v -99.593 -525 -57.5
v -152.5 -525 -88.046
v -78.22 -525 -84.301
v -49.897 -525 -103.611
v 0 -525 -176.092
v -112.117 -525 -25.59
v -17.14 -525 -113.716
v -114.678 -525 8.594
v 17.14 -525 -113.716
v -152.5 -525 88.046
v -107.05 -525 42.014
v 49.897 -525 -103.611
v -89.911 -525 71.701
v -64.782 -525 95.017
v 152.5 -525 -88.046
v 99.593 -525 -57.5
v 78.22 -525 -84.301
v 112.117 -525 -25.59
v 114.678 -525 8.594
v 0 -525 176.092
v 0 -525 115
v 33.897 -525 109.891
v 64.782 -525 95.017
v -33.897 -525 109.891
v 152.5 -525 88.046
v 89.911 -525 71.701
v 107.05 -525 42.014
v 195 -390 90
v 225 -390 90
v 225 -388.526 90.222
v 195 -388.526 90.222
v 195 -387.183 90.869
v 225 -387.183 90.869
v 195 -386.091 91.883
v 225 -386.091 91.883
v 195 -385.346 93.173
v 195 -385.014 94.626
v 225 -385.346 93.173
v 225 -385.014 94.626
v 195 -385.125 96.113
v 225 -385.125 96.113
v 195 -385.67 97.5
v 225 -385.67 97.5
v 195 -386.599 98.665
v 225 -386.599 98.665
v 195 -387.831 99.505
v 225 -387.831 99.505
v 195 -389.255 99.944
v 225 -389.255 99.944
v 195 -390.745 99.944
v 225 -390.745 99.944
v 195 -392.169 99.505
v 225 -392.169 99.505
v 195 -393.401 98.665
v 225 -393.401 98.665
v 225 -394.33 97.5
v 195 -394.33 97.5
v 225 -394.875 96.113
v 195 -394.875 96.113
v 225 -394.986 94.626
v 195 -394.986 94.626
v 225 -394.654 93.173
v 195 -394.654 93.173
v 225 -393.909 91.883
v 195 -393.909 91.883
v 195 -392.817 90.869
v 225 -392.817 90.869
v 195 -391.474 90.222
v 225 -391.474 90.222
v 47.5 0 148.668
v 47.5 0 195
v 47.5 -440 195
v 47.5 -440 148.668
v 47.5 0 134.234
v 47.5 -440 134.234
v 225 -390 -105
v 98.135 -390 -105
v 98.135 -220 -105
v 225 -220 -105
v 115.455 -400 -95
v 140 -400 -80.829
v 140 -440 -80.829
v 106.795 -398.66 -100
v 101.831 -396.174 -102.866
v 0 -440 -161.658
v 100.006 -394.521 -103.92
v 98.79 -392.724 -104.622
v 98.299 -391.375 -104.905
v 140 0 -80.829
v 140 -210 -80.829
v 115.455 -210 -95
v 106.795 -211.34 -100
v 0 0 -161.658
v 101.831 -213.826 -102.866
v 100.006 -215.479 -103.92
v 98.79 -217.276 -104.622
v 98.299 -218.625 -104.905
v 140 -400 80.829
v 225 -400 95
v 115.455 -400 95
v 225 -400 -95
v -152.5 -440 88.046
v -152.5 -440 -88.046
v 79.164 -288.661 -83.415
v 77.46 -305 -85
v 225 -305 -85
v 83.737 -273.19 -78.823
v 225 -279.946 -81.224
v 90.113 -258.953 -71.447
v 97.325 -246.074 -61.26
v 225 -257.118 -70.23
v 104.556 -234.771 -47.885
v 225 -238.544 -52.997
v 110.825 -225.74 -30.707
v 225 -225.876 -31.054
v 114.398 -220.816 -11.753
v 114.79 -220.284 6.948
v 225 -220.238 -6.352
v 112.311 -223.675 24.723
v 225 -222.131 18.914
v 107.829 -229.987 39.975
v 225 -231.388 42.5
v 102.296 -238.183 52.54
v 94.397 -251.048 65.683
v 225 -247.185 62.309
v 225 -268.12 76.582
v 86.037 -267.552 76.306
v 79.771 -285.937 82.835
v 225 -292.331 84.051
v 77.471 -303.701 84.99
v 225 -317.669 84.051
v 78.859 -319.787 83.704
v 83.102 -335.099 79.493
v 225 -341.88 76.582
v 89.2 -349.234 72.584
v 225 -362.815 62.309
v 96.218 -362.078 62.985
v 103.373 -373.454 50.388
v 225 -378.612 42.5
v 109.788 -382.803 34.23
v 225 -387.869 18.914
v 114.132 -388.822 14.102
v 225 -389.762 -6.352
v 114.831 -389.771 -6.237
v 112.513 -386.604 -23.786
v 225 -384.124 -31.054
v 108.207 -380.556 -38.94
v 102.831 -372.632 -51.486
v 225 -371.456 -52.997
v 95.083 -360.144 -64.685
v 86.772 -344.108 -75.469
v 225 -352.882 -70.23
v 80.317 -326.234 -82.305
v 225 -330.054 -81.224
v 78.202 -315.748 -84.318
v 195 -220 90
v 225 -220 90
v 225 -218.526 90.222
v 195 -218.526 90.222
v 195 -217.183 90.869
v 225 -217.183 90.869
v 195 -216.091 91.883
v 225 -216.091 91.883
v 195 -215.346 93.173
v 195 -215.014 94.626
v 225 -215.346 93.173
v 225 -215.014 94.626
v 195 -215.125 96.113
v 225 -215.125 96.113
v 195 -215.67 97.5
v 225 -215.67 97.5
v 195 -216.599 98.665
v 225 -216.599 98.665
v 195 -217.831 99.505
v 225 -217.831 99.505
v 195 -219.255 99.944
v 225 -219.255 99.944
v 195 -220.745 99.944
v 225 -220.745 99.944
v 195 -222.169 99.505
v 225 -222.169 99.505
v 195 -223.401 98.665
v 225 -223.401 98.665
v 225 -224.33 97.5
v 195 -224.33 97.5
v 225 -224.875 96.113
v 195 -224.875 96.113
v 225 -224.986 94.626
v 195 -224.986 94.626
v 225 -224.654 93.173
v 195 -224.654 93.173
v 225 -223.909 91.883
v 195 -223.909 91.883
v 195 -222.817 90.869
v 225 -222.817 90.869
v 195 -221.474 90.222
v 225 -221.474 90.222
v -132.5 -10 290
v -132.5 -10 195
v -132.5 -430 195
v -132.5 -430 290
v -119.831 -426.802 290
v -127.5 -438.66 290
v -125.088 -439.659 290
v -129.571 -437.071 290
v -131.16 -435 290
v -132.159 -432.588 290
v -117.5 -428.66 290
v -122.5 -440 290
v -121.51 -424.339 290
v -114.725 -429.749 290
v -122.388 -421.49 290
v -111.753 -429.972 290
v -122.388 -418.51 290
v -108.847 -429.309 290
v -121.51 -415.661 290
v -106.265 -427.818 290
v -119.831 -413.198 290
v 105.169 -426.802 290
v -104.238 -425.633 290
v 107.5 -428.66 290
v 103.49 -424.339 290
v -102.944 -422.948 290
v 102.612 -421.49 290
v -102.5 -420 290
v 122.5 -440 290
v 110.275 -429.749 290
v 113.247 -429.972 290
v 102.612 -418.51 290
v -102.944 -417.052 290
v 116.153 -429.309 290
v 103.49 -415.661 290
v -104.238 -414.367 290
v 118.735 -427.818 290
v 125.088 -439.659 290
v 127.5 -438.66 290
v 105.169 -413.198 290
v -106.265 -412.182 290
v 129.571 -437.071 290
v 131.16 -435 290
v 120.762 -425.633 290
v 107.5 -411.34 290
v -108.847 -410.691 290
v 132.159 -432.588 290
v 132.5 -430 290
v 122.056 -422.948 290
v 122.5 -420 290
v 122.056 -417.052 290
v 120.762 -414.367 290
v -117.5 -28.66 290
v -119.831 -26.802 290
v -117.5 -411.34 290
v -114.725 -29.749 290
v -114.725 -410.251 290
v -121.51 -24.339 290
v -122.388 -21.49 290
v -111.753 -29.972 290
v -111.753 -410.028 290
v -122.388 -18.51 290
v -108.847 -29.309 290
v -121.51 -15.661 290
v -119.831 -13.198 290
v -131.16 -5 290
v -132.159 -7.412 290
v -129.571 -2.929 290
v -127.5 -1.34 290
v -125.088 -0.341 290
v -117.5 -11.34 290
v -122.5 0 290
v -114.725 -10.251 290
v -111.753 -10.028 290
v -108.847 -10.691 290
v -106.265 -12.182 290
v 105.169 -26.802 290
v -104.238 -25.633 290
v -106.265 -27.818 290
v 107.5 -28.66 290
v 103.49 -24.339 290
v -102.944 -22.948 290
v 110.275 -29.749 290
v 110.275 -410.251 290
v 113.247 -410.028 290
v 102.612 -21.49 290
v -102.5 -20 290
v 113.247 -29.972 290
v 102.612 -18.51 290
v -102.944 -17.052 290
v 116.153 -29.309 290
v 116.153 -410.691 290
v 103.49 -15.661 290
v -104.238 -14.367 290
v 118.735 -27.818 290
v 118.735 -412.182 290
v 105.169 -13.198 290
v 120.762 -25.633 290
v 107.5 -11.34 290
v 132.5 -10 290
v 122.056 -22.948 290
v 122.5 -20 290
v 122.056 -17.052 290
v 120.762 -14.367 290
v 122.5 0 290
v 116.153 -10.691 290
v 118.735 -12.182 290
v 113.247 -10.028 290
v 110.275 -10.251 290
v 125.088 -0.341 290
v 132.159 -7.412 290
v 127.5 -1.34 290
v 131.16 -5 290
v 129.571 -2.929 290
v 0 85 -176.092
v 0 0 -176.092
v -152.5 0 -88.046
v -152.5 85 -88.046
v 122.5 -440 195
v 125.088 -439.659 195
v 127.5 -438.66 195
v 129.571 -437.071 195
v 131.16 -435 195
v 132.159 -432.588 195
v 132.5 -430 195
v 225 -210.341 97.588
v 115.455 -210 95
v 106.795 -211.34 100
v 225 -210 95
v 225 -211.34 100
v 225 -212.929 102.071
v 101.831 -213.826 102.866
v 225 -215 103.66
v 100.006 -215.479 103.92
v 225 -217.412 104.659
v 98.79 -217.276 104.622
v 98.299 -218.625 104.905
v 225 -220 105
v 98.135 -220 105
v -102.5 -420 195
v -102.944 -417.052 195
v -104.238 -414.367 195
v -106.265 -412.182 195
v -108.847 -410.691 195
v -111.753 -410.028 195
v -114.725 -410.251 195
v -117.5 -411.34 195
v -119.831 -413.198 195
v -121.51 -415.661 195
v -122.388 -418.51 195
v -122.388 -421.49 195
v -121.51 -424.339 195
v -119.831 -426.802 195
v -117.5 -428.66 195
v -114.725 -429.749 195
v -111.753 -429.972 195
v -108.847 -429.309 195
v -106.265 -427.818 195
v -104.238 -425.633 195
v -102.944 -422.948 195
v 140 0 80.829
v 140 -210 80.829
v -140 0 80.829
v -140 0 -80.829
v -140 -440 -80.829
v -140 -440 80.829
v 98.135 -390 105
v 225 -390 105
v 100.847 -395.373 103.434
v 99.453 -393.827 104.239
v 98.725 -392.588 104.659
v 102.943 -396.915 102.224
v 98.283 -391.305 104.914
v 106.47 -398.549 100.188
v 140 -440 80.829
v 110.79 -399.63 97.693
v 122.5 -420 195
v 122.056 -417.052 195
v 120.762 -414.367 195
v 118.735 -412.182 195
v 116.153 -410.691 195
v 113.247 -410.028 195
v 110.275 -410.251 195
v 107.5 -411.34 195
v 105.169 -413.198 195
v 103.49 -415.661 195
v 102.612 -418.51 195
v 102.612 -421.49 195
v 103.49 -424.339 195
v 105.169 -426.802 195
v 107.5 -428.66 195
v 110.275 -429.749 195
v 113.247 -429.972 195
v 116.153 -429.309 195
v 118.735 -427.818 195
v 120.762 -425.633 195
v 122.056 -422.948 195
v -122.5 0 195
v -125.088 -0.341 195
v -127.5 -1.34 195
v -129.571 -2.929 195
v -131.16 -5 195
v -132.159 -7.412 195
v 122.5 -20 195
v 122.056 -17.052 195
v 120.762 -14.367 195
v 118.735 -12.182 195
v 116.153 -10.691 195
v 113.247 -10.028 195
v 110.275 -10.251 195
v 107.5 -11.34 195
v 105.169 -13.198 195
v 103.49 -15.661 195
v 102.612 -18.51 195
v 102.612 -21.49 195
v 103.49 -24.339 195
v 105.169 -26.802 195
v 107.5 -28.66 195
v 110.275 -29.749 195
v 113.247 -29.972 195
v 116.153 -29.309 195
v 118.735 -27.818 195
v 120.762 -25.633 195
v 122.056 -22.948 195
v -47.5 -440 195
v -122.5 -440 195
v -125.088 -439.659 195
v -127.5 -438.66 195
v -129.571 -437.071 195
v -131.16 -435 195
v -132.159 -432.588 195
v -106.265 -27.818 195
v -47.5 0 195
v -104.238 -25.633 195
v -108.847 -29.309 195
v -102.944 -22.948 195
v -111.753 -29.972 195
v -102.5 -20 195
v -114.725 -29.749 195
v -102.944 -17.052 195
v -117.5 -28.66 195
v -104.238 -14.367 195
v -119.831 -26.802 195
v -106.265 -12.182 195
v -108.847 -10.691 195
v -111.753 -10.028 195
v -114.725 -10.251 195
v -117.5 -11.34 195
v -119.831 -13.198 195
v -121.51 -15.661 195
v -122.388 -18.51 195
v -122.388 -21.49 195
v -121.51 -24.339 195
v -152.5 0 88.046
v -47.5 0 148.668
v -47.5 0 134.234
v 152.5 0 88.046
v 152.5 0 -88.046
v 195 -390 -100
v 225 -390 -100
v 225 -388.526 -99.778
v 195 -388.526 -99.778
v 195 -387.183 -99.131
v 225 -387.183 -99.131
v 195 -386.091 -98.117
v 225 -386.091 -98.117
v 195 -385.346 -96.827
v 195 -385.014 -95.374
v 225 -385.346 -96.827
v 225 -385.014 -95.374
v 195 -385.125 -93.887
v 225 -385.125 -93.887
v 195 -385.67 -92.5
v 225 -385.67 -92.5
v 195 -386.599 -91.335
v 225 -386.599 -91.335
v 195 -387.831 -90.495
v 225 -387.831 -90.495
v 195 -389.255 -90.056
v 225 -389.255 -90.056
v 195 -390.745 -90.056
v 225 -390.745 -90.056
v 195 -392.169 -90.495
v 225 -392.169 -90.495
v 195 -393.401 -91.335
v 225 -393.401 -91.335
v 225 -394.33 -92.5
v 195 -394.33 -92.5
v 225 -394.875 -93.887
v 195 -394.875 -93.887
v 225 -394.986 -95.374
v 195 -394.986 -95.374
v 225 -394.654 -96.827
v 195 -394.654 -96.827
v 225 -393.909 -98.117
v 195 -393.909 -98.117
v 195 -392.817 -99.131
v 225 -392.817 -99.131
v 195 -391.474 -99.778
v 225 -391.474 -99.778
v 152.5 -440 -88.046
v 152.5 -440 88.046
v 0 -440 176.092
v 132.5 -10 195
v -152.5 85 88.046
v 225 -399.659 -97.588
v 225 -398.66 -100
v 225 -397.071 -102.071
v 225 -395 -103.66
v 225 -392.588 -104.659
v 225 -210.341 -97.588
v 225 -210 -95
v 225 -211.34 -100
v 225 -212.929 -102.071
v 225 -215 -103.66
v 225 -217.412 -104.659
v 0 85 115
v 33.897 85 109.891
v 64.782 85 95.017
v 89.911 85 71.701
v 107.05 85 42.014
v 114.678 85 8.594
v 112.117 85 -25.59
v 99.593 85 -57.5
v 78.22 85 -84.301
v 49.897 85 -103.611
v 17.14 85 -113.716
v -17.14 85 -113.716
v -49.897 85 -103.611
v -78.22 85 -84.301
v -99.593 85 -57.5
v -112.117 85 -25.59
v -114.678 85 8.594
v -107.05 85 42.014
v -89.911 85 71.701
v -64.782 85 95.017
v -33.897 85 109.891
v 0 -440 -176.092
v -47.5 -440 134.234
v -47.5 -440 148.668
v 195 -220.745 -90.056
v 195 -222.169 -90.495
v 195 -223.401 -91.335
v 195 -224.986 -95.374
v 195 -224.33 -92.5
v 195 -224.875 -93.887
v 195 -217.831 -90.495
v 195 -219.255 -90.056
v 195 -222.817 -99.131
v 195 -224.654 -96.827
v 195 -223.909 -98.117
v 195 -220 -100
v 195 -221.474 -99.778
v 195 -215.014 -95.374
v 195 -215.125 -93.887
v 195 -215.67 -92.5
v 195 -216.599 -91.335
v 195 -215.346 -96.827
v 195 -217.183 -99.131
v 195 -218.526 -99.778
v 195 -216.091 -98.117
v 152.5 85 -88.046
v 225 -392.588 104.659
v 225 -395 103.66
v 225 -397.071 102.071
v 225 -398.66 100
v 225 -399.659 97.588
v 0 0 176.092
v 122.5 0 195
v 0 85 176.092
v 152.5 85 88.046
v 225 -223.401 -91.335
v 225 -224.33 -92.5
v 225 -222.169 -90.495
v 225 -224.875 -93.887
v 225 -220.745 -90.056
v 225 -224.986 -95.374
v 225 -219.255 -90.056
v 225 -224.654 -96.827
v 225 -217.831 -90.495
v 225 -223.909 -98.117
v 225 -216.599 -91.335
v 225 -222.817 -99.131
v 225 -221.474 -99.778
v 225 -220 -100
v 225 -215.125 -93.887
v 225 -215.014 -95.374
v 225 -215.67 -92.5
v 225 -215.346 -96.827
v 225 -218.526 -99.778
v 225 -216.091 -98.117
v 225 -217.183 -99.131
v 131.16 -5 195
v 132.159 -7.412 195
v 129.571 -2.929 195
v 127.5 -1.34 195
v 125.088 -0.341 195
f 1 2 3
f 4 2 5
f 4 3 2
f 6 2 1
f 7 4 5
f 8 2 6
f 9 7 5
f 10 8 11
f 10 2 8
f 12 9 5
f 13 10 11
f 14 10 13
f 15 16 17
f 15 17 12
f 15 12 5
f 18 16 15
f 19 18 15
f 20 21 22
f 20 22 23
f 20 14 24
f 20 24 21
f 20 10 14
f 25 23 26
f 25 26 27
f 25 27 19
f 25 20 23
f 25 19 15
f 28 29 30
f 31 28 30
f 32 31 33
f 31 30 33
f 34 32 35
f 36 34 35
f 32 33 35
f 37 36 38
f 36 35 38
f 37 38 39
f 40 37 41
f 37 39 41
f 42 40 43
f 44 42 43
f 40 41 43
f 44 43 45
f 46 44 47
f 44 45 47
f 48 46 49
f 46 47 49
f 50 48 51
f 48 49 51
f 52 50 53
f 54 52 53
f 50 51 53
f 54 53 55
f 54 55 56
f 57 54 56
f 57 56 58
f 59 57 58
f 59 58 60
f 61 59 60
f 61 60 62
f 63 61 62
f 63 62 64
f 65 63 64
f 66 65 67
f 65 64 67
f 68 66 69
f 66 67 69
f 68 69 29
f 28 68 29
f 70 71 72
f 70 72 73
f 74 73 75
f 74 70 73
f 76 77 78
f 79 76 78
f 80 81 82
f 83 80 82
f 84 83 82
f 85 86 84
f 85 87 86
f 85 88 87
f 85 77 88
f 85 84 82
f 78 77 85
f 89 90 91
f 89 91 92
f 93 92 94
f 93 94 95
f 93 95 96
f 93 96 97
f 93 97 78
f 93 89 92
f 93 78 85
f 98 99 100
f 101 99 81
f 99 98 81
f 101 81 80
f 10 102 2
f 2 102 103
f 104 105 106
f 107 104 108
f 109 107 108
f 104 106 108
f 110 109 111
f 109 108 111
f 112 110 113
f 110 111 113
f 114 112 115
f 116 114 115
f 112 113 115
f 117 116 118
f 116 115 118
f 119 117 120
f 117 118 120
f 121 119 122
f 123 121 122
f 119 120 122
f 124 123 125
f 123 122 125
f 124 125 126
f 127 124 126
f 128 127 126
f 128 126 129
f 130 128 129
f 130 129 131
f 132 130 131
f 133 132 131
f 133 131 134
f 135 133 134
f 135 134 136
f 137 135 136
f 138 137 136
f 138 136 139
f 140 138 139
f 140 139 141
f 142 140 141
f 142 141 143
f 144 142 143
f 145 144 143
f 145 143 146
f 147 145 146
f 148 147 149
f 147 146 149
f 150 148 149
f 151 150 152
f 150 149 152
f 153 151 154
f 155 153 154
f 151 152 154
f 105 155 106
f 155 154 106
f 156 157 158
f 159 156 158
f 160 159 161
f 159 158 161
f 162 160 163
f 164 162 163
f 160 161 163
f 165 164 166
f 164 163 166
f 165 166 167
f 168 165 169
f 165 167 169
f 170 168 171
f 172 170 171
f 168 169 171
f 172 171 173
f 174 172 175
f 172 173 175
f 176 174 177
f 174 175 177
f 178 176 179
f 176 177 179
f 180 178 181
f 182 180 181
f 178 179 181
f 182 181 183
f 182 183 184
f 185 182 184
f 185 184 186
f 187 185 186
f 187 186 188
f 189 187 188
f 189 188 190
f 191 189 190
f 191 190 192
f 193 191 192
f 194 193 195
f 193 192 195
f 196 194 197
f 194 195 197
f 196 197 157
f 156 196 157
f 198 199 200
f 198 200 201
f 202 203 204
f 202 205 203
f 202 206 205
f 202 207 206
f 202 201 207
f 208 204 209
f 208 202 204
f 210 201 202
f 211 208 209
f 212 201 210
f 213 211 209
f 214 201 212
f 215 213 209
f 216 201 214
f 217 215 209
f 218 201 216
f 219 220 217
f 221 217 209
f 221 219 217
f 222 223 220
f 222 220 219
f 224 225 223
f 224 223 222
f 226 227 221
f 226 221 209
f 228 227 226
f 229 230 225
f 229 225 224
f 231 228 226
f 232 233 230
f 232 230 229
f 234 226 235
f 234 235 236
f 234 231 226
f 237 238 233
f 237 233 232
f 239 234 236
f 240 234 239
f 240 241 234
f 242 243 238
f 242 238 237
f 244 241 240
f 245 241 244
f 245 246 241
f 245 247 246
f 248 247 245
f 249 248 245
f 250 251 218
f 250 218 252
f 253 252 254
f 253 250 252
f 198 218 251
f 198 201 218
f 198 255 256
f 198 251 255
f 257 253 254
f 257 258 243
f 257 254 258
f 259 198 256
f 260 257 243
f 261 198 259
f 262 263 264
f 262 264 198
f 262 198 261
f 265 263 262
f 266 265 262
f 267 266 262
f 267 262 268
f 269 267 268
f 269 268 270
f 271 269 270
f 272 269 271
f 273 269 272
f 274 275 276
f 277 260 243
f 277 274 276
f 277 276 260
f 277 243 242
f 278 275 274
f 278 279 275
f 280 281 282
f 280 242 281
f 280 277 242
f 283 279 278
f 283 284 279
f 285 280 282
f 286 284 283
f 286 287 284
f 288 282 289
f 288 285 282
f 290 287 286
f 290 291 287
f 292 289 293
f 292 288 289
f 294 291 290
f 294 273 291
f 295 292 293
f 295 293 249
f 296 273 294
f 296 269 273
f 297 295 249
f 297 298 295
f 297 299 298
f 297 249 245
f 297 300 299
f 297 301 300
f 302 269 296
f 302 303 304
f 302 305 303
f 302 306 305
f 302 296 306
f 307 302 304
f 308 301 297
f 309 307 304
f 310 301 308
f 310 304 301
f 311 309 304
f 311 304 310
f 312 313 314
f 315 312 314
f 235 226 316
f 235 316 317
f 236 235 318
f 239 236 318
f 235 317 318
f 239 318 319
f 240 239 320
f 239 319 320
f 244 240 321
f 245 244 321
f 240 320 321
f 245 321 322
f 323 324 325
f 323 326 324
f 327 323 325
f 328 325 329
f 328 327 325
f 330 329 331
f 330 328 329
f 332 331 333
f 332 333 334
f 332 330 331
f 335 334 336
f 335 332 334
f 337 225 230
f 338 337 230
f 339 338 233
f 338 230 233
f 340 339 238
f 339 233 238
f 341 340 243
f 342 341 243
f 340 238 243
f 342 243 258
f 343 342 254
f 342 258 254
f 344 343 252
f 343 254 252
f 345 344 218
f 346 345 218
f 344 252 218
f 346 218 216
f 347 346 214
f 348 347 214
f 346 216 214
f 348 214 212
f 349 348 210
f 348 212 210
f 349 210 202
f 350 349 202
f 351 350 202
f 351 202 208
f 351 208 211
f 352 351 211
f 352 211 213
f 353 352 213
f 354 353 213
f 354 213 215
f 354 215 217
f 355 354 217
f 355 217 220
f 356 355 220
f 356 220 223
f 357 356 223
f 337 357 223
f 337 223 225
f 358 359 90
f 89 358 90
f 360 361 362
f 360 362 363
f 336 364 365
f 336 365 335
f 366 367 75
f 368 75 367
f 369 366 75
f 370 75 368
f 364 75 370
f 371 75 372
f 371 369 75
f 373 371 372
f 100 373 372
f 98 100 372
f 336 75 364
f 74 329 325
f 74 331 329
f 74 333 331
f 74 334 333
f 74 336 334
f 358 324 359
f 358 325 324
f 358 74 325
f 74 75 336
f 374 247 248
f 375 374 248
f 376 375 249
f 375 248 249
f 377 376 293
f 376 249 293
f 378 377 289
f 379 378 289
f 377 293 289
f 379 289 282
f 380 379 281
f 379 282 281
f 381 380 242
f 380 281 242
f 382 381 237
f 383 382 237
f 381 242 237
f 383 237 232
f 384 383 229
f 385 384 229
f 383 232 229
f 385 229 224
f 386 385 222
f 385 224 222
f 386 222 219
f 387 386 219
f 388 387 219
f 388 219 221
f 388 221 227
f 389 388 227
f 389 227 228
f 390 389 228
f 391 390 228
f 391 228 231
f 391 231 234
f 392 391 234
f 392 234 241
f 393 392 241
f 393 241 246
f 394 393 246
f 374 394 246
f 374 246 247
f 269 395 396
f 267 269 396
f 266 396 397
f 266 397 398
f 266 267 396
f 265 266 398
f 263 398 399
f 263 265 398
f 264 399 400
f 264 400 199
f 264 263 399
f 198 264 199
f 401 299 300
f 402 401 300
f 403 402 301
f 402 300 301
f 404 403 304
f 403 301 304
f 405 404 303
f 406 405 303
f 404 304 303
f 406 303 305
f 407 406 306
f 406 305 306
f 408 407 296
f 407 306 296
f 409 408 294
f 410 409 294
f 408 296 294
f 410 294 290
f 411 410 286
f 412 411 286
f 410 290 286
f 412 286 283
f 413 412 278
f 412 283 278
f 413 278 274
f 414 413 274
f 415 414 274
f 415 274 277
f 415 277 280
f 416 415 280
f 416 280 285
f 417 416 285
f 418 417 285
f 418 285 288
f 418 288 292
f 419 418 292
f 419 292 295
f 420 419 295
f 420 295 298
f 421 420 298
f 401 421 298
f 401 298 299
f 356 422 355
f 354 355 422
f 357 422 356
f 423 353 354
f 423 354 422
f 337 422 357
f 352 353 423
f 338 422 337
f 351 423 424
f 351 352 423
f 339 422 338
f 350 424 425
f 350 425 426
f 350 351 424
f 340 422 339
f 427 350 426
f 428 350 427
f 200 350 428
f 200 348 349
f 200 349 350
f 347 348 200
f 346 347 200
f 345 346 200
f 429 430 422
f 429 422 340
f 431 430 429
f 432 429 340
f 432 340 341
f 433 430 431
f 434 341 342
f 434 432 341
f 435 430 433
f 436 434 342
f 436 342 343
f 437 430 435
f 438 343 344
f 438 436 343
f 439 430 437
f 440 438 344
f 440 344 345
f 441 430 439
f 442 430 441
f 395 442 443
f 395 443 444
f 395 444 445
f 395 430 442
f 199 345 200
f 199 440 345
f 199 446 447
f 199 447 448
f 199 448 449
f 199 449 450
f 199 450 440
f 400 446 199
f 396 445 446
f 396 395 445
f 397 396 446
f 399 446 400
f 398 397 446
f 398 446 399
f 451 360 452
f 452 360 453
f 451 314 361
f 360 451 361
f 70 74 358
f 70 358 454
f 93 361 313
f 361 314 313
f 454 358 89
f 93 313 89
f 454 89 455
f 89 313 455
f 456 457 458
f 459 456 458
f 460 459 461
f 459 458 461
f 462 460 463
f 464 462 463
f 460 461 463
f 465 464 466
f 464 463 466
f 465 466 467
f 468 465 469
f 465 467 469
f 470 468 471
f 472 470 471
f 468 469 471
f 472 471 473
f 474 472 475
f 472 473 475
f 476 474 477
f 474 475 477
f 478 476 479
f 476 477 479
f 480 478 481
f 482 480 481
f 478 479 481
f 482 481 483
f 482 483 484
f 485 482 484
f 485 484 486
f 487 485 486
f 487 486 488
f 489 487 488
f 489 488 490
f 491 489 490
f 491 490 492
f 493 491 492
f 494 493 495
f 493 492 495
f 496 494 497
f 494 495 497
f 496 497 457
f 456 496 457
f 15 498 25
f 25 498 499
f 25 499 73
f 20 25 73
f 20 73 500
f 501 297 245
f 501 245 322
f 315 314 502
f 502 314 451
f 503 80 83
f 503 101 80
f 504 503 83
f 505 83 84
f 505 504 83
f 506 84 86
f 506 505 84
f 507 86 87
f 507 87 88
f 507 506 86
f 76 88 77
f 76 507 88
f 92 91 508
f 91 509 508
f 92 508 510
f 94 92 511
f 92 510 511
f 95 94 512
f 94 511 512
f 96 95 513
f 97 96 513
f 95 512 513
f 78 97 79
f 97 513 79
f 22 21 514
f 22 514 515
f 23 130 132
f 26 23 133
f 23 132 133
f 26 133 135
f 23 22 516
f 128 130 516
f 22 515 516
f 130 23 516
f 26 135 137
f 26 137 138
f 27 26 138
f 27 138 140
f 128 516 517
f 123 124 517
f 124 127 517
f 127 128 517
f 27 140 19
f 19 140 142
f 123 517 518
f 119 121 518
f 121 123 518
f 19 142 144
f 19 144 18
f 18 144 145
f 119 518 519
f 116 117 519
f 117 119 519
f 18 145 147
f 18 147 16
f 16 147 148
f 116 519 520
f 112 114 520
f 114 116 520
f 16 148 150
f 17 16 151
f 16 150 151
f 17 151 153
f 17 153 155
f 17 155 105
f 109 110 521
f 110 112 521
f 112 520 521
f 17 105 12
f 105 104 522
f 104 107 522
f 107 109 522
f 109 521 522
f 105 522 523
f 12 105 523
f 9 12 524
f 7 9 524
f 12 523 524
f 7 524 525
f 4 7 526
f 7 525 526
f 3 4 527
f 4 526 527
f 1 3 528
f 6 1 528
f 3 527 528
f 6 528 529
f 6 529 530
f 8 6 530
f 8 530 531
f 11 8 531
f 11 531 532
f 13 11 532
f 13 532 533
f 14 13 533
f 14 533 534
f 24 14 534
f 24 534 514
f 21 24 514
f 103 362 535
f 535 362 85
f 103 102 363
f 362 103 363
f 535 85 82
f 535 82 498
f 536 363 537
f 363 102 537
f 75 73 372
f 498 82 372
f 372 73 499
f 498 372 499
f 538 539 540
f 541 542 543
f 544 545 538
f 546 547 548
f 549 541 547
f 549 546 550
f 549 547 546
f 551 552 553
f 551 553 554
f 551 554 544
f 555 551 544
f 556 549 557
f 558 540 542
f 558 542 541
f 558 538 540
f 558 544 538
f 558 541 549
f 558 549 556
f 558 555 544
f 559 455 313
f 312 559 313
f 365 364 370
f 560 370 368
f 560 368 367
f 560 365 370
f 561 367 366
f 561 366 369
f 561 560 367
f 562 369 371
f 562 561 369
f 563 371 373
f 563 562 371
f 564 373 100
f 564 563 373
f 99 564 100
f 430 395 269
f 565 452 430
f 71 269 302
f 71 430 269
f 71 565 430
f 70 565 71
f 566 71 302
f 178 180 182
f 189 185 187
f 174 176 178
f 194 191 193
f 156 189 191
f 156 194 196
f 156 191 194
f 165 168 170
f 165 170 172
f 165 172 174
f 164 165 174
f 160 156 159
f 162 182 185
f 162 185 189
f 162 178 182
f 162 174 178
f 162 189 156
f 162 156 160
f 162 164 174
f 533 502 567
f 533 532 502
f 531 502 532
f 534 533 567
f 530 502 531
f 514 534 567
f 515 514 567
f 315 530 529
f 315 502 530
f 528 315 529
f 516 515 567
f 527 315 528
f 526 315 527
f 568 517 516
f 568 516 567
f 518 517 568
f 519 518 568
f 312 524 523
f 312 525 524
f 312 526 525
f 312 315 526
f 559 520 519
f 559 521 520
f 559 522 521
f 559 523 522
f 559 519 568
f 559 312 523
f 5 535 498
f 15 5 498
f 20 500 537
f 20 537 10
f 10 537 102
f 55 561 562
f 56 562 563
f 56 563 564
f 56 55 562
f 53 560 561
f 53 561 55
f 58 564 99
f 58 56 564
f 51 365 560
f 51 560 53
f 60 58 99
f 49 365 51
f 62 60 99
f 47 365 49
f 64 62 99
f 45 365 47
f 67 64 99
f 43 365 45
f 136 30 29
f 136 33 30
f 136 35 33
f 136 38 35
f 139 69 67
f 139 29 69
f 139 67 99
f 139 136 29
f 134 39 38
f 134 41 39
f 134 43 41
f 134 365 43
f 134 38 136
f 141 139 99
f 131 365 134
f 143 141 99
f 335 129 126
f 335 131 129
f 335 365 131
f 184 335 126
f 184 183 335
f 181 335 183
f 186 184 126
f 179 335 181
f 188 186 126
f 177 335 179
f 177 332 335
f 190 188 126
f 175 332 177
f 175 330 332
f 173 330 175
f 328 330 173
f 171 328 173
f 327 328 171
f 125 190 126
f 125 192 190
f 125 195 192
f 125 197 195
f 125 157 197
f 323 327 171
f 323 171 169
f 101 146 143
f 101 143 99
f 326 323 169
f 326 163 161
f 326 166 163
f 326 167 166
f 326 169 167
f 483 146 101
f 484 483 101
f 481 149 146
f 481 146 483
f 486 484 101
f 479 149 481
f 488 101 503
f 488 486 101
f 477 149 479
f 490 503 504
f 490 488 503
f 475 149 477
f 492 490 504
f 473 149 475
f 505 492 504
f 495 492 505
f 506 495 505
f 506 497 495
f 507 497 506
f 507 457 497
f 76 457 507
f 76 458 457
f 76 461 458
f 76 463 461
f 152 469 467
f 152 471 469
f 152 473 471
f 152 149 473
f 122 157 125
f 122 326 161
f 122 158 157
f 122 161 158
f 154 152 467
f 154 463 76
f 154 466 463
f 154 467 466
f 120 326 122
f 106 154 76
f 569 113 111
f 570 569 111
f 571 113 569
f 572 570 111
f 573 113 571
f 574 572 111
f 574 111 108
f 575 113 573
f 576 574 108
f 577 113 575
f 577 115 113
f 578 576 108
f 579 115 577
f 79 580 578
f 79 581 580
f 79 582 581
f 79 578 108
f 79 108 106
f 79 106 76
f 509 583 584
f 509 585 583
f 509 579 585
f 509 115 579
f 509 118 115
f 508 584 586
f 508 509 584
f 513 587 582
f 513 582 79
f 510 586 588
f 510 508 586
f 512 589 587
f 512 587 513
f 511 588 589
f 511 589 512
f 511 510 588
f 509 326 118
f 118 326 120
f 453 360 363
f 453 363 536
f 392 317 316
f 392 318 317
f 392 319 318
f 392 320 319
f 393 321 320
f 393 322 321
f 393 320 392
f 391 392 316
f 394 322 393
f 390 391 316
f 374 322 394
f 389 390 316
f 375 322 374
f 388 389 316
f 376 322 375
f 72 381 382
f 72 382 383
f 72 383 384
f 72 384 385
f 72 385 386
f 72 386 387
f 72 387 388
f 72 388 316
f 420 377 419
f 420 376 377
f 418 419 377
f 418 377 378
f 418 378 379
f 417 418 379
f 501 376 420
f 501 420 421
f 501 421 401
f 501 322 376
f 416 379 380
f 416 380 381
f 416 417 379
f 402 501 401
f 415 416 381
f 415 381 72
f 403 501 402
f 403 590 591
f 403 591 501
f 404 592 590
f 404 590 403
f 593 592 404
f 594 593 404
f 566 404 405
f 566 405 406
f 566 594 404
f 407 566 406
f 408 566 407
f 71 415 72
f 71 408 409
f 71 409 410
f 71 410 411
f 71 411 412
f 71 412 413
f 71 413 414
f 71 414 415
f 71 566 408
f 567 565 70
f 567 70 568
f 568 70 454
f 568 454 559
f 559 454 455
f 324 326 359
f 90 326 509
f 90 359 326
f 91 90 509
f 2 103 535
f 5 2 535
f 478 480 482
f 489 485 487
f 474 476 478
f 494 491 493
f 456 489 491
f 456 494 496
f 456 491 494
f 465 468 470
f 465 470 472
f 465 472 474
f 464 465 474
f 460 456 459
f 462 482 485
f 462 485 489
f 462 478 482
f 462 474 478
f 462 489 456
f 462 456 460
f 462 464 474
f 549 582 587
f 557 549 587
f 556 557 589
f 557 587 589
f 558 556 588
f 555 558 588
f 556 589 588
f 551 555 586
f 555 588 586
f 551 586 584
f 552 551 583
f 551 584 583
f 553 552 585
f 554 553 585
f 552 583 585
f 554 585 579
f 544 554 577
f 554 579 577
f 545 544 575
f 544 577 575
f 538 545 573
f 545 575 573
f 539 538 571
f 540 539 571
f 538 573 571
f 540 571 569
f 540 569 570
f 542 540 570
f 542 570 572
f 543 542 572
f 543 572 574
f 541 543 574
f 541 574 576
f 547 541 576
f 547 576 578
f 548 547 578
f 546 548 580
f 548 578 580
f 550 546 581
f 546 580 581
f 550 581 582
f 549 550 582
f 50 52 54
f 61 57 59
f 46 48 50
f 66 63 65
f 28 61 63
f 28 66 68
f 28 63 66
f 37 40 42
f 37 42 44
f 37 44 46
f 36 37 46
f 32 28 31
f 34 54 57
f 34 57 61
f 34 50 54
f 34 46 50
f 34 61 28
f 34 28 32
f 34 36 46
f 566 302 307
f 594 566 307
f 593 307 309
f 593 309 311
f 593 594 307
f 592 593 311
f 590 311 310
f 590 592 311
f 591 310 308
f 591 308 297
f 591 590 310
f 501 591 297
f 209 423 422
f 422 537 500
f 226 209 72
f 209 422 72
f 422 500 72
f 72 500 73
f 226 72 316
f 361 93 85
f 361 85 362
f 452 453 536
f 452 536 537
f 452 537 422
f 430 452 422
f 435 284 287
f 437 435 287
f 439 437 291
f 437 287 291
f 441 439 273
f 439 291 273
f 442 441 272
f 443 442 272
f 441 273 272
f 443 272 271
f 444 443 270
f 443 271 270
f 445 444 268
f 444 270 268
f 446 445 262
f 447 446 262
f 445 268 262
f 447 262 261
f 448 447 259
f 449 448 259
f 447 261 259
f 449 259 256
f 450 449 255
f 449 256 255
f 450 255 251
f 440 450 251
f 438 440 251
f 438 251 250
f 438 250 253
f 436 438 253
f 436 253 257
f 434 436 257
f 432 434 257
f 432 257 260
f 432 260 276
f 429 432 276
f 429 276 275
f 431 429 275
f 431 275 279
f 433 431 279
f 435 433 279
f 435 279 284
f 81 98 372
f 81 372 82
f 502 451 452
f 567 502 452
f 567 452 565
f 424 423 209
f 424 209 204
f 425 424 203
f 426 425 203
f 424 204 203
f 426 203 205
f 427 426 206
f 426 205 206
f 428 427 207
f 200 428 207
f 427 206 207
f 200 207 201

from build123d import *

# Parameters (mm, degrees)
EXTRUDE_1_DEPTH             = 85
EXTRUDE_798_DEPTH           = 440
EXTRUDE_2_DEPTH             = 85
EXTRUDE_1413_DEPTH          = 85
EXTRUDE_1413_DEPTH_BACK     = 140
SKETCH_10_W                 = 210
SKETCH_10_H                 = 190
SKETCH_5_R                  = 115
CUT_EXTRUDE_1475_DEPTH      = 712.91642768
CUT_EXTRUDE_1609_REACH      = 710.683
CUT_EXTRUDE_1609_END_RADIUS = 115
SKETCH_12_R                 = 85
CUT_EXTRUDE_2000_REACH      = 739.219
SKETCH_13_R                 = 10
SKETCH_14_R                 = 5
CUT_EXTRUDE_6_DEPTH         = 30
FILLET_2_R                  = 10
FILLET_3_R                  = 10


with BuildPart() as part:
    # Эскиз2 → Боковой многогранник 1 (new body)
    with BuildSketch(Plane(origin=(0, 0, 0), x_dir=(1, 0, 0), z_dir=(0, 1, 0))):
        Polygon((0, 176.091832103), (-152.5, 88.045916051), (-152.5, -88.045916051), (0, -176.091832103), (152.5, -88.045916051), (152.5, 88.045916051), align=None)
    extrude(amount=EXTRUDE_1_DEPTH)

    # Sketch 344 → Extrude 798 (add)
    with BuildSketch(Plane(origin=(0, 0, 0), x_dir=(1, 0, 0), z_dir=(0, 1, 0))):
        Polygon((0, 161.658075373), (-140, 80.829037687), (-140, -80.829037687), (-47.5, -134.233937587), (-47.5, -195), (-132.5, -195), (-132.5, -290), (132.5, -290), (132.5, -195), (47.5, -195), (47.5, -134.233937587), (140, -80.829037687), (140, 80.829037687), align=None)
    extrude(amount=-EXTRUDE_798_DEPTH)

    # Эскиз4 → Боковой многогранник 2 (add)
    with BuildSketch(Plane.XZ.offset(440)):
        Polygon((0, -176.091832103), (152.5, -88.045916051), (152.5, 88.045916051), (0, 176.091832103), (-152.5, 88.045916051), (-152.5, -88.045916051), align=None)
    extrude(amount=EXTRUDE_2_DEPTH)

    # Эскиз10 → Extrude 1413 (add, two sides: drawn at the far end of the back side and taken through both)
    with BuildSketch(Plane(origin=(140, 0, 0), x_dir=(0, 0, -1), z_dir=(1, 0, 0)).offset(-EXTRUDE_1413_DEPTH_BACK)):
        with Locations((0, -305)):
            Rectangle(SKETCH_10_W, SKETCH_10_H)
    extrude(amount=EXTRUDE_1413_DEPTH + EXTRUDE_1413_DEPTH_BACK)

    # Эскиз5 → Cut-Extrude 1475 (cut, through all)
    with BuildSketch(Plane(origin=(0, 85, 0), x_dir=(1, 0, 0), z_dir=(0, 1, 0))):
        with Locations(Location((0, 0, 0), (0, 0, 270))):
            Circle(SKETCH_5_R)
    extrude(amount=-CUT_EXTRUDE_1475_DEPTH, mode=Mode.SUBTRACT)

    # Cut-Extrude 1609: up to this cylinder (the profile starts outside it)
    cut_extrude_1609_end = Plane(origin=(0, -305, 0), z_dir=(0, 1, 0)) * Cylinder(CUT_EXTRUDE_1609_END_RADIUS, 1652.366, mode=Mode.PRIVATE)
    # Эскиз12 → Cut-Extrude 1609 (cut, up to the surface)
    with BuildSketch(Plane(origin=(225, 0, 0), x_dir=(0, 0, -1), z_dir=(1, 0, 0)), mode=Mode.PRIVATE) as cut_extrude_1609_sk1:
        with Locations((0, -305)):
            Circle(SKETCH_12_R)
    cut_extrude_1609_tool1 = extrude(cut_extrude_1609_sk1.sketch, amount=-CUT_EXTRUDE_1609_REACH, mode=Mode.PRIVATE) - cut_extrude_1609_end
    add(cut_extrude_1609_tool1.solids().sort_by_distance((225, -305, 0))[0], mode=Mode.SUBTRACT)

    # Эскиз13 → Cut-Extrude 2000 (cut, up to next)
    with BuildSketch(Plane.XY.offset(290), mode=Mode.PRIVATE) as cut_extrude_2000_sk1:
        with Locations((-112.5, -420)):
            Circle(SKETCH_13_R)
    cut_extrude_2000_tool1 = extrude(cut_extrude_2000_sk1.sketch, amount=-CUT_EXTRUDE_2000_REACH, mode=Mode.PRIVATE) & part.part
    # Эскиз13 → Cut-Extrude 2000 (cut, up to next)
    with BuildSketch(Plane.XY.offset(290), mode=Mode.PRIVATE) as cut_extrude_2000_sk2:
        with Locations((112.5, -420)):
            Circle(SKETCH_13_R)
    cut_extrude_2000_tool2 = extrude(cut_extrude_2000_sk2.sketch, amount=-CUT_EXTRUDE_2000_REACH, mode=Mode.PRIVATE) & part.part
    # Эскиз13 → Cut-Extrude 2000 (cut, up to next)
    with BuildSketch(Plane.XY.offset(290), mode=Mode.PRIVATE) as cut_extrude_2000_sk3:
        with Locations((-112.5, -20)):
            Circle(SKETCH_13_R)
    cut_extrude_2000_tool3 = extrude(cut_extrude_2000_sk3.sketch, amount=-CUT_EXTRUDE_2000_REACH, mode=Mode.PRIVATE) & part.part
    # Эскиз13 → Cut-Extrude 2000 (cut, up to next)
    with BuildSketch(Plane.XY.offset(290), mode=Mode.PRIVATE) as cut_extrude_2000_sk4:
        with Locations((112.5, -20)):
            Circle(SKETCH_13_R)
    cut_extrude_2000_tool4 = extrude(cut_extrude_2000_sk4.sketch, amount=-CUT_EXTRUDE_2000_REACH, mode=Mode.PRIVATE) & part.part
    add(cut_extrude_2000_tool1.solids().sort_by_distance((-112.5, -420, 290))[0], mode=Mode.SUBTRACT)
    add(cut_extrude_2000_tool2.solids().sort_by_distance((112.5, -420, 290))[0], mode=Mode.SUBTRACT)
    add(cut_extrude_2000_tool3.solids().sort_by_distance((-112.5, -20, 290))[0], mode=Mode.SUBTRACT)
    add(cut_extrude_2000_tool4.solids().sort_by_distance((112.5, -20, 290))[0], mode=Mode.SUBTRACT)

    # Эскиз14 → Вырез-Вытянуть6 (cut)
    with BuildSketch(Plane(origin=(225, 0, 0), x_dir=(0, 0, -1), z_dir=(1, 0, 0))):
        with Locations((95, -220)):
            Circle(SKETCH_14_R)
        with Locations((95, -390)):
            Circle(SKETCH_14_R)
        with Locations((-95, -220)):
            Circle(SKETCH_14_R)
        with Locations((-95, -390)):
            Circle(SKETCH_14_R)
    extrude(amount=-CUT_EXTRUDE_6_DEPTH, mode=Mode.SUBTRACT)

    # Скругление2
    fillet_2_edges = [part.edges().sort_by_distance(p)[0] for p in [
        (132.5, -440, 242.5),
        (-132.5, -440, 242.5),
        (-132.5, 0, 242.5),
        (132.5, 0, 242.5),
    ]]
    fillet(fillet_2_edges, radius=FILLET_2_R)

    # Скругление3
    fillet_3_edges = [part.edges().sort_by_distance(p)[0] for p in [
        (161.567332603, -210, -105),
        (161.567332603, -400, -105),
        (161.567332603, -400, 105),
        (161.567332603, -210, 105),
    ]]
    fillet(fillet_3_edges, radius=FILLET_3_R)


solid = part.part
